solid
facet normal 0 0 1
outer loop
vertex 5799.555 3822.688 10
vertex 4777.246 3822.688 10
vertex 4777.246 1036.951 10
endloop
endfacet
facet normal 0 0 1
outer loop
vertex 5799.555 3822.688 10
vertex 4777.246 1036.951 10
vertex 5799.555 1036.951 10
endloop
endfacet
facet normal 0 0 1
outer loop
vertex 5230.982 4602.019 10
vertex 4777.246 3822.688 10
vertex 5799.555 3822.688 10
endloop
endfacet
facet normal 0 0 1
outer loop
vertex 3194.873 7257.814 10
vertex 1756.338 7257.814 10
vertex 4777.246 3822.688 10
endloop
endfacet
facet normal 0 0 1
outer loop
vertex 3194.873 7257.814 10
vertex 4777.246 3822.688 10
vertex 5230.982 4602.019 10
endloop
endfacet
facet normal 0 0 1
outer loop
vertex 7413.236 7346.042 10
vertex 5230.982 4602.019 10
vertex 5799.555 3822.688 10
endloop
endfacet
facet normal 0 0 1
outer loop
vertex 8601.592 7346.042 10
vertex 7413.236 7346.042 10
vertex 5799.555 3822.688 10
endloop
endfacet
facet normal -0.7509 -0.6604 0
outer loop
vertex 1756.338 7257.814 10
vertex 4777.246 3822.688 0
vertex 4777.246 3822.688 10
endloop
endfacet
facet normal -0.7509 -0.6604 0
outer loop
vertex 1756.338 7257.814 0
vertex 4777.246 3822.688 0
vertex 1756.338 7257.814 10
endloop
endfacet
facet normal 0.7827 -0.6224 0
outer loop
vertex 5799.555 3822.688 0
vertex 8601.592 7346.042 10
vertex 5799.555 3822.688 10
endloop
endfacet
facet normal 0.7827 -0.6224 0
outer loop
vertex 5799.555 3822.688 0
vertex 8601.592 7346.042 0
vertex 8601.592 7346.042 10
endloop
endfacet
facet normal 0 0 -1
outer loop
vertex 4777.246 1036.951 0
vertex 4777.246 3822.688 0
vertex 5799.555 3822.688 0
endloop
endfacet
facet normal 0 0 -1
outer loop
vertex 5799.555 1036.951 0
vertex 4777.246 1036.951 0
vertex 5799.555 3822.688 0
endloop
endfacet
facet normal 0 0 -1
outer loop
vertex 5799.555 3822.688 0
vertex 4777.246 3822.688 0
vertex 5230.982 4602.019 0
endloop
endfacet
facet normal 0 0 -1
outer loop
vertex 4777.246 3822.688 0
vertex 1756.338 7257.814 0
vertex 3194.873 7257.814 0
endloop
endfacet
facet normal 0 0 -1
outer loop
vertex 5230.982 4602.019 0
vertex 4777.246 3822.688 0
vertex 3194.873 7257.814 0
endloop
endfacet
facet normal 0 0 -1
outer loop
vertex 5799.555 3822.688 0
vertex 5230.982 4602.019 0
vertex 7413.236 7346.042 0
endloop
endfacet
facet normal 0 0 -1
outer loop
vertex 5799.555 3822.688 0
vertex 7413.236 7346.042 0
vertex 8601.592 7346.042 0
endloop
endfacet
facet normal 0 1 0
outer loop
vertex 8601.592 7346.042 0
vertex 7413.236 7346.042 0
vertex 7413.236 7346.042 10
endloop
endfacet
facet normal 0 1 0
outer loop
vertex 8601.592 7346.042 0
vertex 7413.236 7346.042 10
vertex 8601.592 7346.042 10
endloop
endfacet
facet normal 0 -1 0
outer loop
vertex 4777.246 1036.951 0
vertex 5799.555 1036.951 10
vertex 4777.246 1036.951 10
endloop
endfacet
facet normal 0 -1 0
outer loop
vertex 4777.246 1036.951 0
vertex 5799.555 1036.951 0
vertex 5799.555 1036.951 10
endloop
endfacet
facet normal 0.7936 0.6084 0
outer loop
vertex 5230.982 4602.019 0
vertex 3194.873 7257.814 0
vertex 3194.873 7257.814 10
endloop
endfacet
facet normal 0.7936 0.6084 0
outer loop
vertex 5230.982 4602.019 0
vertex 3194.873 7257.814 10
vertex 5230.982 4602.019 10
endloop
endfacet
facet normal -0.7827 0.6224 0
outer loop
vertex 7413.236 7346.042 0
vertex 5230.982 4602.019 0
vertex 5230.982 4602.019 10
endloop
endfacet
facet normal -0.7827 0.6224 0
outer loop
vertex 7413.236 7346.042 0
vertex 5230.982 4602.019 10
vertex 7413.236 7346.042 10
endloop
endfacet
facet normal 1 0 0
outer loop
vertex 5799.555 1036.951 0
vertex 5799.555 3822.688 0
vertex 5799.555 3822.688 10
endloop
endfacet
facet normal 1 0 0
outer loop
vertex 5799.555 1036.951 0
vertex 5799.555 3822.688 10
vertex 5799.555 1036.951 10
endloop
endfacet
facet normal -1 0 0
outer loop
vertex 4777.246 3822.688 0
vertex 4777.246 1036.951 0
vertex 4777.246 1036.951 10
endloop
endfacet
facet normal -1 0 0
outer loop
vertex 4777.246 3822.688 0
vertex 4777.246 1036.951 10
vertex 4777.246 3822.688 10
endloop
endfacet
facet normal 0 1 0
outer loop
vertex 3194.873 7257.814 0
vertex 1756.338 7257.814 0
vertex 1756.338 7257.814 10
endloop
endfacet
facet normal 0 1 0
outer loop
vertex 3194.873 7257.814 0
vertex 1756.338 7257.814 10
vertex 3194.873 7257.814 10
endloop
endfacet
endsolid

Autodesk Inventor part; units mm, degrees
ref_plane "YZ Plane" through (0, 0, 0) normal (1, 0, 0) x (0, 1, 0)
ref_plane "XZ Plane" through (0, 0, 0) normal (0, 1, 0) x (-1, 0, 0)
ref_plane "XY Plane" through (0, 0, 0) normal (0, 0, 1) x (1, 0, 0)
sketch "Sketch1" plane through (0, 0, 0) normal (0, 0, 1) x (1, 0, 0)
  line L0 (1756.3375, 7257.8135) -> (3194.8729, 7257.8135)
  line L1 (3194.8729, 7257.8135) -> (5230.9819, 4602.0192)
  line L2 (5230.9819, 4602.0192) -> (7413.236, 7346.0417)
  line L3 (7413.236, 7346.0417) -> (8601.5922, 7346.0417)
  line L4 (8601.5922, 7346.0417) -> (5799.5547, 3822.6876)
  line L5 (5799.5547, 3822.6876) -> (5799.5547, 1036.9506)
  line L6 (5799.5547, 1036.9506) -> (4777.2459, 1036.9506)
  line L7 (4777.2459, 1036.9506) -> (4777.2459, 3822.6876)
  line L8 (4777.2459, 3822.6876) -> (1756.3375, 7257.8135)
  point P0 (0, 0)
extrude "Extrusion1" add sketch "Sketch1" along normal blind 10
properties part number "Y"
